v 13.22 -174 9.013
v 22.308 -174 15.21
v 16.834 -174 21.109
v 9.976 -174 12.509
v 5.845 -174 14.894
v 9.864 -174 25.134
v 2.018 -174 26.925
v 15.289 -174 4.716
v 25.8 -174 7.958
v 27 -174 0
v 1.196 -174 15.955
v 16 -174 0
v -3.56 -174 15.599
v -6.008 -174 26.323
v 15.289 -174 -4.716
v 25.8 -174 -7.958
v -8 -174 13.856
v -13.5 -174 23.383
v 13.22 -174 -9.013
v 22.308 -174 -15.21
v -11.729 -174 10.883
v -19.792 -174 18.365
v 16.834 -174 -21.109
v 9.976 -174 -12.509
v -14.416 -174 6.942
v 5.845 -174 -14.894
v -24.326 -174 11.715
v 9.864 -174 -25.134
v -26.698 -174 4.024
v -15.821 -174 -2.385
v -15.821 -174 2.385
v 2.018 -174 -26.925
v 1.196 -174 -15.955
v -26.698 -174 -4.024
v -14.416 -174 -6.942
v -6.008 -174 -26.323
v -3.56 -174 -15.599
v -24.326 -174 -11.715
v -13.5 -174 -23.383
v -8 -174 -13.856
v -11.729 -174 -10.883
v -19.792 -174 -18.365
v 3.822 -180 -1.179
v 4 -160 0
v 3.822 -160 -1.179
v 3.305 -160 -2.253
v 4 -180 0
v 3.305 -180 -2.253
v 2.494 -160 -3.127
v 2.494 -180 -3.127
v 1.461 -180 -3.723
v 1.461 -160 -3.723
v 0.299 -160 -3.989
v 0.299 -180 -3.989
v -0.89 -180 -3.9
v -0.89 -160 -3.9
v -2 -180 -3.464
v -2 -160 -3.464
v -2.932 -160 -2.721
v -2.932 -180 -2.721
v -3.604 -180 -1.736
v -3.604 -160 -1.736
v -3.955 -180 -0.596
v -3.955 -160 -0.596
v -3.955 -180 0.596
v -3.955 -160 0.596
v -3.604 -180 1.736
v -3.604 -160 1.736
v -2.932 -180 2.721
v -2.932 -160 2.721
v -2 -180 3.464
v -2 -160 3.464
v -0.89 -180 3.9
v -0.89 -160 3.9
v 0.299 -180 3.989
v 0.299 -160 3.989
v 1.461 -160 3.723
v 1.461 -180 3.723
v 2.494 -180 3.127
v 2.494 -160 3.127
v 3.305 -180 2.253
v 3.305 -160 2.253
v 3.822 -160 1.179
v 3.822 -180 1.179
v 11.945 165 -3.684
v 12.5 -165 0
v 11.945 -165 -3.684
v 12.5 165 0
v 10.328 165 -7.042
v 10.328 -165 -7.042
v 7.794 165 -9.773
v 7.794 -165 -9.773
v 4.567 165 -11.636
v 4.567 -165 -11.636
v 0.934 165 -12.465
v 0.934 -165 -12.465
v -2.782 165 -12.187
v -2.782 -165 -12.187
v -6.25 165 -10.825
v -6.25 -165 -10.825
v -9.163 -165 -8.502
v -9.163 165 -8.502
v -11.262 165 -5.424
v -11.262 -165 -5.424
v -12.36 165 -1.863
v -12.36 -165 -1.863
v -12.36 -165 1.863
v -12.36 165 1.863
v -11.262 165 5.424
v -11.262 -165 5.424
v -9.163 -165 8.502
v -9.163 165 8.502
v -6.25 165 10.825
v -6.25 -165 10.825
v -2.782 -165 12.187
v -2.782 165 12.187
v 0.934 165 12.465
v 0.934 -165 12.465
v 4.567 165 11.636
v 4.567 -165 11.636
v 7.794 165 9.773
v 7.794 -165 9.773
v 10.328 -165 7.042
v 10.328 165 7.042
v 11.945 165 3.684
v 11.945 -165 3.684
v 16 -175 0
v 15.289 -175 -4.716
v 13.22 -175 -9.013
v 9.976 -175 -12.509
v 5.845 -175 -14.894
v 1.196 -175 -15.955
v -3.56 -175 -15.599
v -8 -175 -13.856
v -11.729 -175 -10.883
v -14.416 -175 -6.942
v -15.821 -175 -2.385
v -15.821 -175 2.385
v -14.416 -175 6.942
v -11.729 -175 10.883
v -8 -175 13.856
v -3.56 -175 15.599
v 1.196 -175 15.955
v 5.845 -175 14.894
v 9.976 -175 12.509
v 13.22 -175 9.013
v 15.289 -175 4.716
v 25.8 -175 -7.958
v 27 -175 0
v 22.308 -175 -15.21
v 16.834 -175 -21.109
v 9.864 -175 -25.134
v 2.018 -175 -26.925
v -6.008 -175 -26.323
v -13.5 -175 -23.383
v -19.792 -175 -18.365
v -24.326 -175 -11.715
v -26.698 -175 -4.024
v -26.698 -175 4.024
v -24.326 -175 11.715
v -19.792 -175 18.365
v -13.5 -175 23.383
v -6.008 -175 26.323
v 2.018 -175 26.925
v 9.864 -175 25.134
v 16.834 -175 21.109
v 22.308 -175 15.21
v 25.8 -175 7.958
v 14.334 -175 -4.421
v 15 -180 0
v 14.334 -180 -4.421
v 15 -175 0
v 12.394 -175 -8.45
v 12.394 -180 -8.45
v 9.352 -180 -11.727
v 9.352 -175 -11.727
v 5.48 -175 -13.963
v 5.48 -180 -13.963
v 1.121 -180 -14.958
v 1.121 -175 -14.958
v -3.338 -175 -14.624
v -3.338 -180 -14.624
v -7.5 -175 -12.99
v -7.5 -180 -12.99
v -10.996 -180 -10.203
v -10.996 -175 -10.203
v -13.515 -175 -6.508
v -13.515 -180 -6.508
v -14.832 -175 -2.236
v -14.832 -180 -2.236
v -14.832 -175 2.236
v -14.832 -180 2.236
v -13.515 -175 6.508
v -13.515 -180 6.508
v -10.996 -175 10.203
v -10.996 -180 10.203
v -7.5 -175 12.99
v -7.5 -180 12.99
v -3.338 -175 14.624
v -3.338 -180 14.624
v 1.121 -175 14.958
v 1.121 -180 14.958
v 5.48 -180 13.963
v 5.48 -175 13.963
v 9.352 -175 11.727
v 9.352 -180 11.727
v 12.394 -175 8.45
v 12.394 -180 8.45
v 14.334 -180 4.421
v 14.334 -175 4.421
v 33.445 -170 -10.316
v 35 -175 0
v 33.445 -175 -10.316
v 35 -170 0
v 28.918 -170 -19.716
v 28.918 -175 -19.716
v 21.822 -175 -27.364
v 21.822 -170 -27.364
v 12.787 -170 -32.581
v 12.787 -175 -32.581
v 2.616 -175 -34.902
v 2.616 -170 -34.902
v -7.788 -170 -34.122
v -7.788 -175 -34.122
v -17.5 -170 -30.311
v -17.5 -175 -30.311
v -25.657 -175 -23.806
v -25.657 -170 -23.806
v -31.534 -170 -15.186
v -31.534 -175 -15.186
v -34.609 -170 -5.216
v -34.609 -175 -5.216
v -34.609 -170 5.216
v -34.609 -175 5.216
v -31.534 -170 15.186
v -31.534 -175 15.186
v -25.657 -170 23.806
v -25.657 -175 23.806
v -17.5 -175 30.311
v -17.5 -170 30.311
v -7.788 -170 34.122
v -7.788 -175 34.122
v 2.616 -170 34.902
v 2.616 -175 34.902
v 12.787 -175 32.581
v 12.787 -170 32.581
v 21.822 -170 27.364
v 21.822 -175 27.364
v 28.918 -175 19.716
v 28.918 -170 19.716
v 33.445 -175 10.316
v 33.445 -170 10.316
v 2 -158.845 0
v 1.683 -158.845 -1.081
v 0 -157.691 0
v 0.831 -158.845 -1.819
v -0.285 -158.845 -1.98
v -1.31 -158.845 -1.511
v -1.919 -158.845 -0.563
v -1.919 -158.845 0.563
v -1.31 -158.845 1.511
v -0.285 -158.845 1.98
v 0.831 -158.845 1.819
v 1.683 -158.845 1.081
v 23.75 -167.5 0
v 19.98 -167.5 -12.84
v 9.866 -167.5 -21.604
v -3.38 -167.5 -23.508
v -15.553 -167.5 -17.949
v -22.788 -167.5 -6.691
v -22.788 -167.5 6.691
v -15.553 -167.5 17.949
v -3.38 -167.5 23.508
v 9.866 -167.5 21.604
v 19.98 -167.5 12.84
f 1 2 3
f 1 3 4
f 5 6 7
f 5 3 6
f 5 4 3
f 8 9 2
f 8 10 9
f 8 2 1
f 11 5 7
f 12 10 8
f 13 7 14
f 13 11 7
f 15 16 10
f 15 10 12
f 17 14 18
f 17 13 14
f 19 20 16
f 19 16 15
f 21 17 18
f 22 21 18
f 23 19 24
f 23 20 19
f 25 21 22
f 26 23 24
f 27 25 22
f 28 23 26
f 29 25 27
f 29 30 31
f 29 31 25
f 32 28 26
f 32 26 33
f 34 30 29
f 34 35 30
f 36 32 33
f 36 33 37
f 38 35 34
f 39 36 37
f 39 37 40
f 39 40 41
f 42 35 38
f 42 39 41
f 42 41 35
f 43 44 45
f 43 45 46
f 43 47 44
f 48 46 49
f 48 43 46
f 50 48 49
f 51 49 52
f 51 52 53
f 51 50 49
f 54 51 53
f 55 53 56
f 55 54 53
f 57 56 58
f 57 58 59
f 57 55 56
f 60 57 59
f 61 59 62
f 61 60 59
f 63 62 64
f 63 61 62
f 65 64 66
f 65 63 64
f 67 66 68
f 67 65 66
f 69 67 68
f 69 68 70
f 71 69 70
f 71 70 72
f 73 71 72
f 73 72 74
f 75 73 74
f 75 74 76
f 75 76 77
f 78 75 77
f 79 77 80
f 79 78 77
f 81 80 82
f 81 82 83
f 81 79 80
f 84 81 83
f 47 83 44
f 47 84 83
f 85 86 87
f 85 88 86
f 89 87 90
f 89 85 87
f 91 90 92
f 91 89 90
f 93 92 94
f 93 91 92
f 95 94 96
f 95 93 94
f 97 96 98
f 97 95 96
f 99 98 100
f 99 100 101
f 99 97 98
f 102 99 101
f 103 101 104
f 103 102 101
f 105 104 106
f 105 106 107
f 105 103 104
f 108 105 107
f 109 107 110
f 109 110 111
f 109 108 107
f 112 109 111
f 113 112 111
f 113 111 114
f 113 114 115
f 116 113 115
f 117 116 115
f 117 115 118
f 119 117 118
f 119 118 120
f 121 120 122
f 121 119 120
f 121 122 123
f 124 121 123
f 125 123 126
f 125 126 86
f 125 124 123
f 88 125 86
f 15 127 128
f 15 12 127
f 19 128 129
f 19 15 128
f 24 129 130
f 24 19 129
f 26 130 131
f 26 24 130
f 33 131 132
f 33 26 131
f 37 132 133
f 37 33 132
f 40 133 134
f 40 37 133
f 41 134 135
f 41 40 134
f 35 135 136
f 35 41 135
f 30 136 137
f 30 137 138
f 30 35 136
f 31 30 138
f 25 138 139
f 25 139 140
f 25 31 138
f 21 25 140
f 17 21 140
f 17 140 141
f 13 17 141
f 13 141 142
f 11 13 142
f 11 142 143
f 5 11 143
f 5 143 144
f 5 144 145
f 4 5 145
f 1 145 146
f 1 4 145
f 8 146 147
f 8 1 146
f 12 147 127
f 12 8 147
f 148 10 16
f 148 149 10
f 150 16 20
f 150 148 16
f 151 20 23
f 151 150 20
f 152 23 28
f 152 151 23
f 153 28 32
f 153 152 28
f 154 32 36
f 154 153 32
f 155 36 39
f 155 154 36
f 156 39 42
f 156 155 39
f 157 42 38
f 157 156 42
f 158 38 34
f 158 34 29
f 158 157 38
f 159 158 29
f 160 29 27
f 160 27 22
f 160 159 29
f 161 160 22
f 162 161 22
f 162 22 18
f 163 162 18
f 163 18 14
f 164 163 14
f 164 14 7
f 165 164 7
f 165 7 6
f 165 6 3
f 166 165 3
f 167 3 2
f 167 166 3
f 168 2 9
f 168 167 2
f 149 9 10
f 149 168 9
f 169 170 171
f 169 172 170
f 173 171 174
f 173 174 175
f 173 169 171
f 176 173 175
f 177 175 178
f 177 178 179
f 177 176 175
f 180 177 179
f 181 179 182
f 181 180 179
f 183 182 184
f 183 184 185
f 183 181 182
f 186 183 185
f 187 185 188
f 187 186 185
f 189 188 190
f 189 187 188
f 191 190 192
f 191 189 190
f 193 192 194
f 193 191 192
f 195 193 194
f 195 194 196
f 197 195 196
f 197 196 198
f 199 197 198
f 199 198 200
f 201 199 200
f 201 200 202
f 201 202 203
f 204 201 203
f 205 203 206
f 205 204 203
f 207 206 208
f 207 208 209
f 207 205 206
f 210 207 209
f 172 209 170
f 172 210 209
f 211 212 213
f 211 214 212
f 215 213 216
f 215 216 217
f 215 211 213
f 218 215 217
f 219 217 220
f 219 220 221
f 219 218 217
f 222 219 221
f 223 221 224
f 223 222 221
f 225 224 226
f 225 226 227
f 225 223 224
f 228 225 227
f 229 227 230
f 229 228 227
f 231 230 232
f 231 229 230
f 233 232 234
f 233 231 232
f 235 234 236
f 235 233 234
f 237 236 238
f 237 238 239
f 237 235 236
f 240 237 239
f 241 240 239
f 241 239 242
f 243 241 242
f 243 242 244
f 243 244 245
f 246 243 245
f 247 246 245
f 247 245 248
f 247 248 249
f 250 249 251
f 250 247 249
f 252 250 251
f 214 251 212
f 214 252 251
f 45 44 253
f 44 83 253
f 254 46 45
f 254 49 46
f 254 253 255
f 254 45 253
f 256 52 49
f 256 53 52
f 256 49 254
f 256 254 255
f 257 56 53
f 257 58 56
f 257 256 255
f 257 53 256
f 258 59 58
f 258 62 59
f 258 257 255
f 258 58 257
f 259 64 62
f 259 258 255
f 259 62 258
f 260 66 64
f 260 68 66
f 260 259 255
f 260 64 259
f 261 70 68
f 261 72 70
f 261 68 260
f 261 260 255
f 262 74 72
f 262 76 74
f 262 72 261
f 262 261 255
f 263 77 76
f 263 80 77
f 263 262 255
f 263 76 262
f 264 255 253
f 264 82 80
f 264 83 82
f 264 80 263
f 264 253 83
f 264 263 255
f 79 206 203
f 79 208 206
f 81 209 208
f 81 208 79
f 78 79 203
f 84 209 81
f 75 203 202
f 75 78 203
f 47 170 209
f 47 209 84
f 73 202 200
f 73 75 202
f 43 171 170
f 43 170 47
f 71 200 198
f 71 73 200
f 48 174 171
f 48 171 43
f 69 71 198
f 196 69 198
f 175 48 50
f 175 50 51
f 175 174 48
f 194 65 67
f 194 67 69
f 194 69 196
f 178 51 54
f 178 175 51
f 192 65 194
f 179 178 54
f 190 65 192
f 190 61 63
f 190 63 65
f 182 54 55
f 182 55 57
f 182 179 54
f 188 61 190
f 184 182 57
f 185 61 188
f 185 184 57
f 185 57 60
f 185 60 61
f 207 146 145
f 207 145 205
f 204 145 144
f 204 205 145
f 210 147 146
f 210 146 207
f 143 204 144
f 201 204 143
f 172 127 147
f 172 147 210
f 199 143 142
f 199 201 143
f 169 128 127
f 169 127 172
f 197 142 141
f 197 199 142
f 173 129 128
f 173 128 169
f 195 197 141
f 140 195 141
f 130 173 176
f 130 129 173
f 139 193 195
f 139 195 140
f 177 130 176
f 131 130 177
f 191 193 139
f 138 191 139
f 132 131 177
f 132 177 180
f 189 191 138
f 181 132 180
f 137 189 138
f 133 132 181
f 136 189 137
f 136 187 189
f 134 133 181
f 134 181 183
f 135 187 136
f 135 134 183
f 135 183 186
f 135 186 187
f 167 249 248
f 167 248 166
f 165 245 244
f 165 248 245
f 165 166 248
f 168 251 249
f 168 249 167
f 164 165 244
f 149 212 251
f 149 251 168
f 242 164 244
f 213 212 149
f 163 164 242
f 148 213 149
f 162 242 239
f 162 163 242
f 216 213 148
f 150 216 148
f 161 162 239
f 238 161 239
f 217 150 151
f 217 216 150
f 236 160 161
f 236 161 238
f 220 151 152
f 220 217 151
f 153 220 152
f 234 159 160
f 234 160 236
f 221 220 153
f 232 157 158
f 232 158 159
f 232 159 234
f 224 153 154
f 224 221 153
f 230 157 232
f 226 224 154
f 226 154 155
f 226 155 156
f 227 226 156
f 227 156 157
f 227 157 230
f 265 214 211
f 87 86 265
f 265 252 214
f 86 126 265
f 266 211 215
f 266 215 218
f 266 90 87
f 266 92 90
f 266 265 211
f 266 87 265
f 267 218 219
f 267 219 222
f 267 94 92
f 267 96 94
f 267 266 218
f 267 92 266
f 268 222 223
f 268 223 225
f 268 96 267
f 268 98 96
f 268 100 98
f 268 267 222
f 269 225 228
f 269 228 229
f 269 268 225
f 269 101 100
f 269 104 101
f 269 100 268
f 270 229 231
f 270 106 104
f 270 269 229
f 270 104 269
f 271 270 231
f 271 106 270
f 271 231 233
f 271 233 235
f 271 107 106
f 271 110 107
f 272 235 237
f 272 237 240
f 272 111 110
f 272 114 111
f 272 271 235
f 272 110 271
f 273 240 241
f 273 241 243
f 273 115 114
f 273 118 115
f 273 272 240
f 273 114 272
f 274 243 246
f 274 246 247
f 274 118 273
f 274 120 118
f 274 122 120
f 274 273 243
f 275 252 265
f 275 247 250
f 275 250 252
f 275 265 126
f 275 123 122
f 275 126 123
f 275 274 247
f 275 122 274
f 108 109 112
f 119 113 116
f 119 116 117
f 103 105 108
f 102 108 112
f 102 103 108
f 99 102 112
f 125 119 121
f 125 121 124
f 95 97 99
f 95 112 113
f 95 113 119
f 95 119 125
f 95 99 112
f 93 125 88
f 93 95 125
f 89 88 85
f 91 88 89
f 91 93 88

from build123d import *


with BuildPart() as f1:
    # F0 (on Top) → F1 (revolve)
    with BuildSketch(Plane.XY):
        Polygon((12.5, -165), (4, -165), (4, -180), (15, -180), (15, -175), (16, -175), (16, -174), (27, -174), (27, -175), (35, -175), (35, -170), align=None)
        Polygon((4, -160), (4, -165), (12.5, -165), (12.5, 165), (0, 165), (0, -157.690599), align=None)
    revolve(axis=Axis((0, 0, 0), (0, 1, 0)))


solid = f1.part
